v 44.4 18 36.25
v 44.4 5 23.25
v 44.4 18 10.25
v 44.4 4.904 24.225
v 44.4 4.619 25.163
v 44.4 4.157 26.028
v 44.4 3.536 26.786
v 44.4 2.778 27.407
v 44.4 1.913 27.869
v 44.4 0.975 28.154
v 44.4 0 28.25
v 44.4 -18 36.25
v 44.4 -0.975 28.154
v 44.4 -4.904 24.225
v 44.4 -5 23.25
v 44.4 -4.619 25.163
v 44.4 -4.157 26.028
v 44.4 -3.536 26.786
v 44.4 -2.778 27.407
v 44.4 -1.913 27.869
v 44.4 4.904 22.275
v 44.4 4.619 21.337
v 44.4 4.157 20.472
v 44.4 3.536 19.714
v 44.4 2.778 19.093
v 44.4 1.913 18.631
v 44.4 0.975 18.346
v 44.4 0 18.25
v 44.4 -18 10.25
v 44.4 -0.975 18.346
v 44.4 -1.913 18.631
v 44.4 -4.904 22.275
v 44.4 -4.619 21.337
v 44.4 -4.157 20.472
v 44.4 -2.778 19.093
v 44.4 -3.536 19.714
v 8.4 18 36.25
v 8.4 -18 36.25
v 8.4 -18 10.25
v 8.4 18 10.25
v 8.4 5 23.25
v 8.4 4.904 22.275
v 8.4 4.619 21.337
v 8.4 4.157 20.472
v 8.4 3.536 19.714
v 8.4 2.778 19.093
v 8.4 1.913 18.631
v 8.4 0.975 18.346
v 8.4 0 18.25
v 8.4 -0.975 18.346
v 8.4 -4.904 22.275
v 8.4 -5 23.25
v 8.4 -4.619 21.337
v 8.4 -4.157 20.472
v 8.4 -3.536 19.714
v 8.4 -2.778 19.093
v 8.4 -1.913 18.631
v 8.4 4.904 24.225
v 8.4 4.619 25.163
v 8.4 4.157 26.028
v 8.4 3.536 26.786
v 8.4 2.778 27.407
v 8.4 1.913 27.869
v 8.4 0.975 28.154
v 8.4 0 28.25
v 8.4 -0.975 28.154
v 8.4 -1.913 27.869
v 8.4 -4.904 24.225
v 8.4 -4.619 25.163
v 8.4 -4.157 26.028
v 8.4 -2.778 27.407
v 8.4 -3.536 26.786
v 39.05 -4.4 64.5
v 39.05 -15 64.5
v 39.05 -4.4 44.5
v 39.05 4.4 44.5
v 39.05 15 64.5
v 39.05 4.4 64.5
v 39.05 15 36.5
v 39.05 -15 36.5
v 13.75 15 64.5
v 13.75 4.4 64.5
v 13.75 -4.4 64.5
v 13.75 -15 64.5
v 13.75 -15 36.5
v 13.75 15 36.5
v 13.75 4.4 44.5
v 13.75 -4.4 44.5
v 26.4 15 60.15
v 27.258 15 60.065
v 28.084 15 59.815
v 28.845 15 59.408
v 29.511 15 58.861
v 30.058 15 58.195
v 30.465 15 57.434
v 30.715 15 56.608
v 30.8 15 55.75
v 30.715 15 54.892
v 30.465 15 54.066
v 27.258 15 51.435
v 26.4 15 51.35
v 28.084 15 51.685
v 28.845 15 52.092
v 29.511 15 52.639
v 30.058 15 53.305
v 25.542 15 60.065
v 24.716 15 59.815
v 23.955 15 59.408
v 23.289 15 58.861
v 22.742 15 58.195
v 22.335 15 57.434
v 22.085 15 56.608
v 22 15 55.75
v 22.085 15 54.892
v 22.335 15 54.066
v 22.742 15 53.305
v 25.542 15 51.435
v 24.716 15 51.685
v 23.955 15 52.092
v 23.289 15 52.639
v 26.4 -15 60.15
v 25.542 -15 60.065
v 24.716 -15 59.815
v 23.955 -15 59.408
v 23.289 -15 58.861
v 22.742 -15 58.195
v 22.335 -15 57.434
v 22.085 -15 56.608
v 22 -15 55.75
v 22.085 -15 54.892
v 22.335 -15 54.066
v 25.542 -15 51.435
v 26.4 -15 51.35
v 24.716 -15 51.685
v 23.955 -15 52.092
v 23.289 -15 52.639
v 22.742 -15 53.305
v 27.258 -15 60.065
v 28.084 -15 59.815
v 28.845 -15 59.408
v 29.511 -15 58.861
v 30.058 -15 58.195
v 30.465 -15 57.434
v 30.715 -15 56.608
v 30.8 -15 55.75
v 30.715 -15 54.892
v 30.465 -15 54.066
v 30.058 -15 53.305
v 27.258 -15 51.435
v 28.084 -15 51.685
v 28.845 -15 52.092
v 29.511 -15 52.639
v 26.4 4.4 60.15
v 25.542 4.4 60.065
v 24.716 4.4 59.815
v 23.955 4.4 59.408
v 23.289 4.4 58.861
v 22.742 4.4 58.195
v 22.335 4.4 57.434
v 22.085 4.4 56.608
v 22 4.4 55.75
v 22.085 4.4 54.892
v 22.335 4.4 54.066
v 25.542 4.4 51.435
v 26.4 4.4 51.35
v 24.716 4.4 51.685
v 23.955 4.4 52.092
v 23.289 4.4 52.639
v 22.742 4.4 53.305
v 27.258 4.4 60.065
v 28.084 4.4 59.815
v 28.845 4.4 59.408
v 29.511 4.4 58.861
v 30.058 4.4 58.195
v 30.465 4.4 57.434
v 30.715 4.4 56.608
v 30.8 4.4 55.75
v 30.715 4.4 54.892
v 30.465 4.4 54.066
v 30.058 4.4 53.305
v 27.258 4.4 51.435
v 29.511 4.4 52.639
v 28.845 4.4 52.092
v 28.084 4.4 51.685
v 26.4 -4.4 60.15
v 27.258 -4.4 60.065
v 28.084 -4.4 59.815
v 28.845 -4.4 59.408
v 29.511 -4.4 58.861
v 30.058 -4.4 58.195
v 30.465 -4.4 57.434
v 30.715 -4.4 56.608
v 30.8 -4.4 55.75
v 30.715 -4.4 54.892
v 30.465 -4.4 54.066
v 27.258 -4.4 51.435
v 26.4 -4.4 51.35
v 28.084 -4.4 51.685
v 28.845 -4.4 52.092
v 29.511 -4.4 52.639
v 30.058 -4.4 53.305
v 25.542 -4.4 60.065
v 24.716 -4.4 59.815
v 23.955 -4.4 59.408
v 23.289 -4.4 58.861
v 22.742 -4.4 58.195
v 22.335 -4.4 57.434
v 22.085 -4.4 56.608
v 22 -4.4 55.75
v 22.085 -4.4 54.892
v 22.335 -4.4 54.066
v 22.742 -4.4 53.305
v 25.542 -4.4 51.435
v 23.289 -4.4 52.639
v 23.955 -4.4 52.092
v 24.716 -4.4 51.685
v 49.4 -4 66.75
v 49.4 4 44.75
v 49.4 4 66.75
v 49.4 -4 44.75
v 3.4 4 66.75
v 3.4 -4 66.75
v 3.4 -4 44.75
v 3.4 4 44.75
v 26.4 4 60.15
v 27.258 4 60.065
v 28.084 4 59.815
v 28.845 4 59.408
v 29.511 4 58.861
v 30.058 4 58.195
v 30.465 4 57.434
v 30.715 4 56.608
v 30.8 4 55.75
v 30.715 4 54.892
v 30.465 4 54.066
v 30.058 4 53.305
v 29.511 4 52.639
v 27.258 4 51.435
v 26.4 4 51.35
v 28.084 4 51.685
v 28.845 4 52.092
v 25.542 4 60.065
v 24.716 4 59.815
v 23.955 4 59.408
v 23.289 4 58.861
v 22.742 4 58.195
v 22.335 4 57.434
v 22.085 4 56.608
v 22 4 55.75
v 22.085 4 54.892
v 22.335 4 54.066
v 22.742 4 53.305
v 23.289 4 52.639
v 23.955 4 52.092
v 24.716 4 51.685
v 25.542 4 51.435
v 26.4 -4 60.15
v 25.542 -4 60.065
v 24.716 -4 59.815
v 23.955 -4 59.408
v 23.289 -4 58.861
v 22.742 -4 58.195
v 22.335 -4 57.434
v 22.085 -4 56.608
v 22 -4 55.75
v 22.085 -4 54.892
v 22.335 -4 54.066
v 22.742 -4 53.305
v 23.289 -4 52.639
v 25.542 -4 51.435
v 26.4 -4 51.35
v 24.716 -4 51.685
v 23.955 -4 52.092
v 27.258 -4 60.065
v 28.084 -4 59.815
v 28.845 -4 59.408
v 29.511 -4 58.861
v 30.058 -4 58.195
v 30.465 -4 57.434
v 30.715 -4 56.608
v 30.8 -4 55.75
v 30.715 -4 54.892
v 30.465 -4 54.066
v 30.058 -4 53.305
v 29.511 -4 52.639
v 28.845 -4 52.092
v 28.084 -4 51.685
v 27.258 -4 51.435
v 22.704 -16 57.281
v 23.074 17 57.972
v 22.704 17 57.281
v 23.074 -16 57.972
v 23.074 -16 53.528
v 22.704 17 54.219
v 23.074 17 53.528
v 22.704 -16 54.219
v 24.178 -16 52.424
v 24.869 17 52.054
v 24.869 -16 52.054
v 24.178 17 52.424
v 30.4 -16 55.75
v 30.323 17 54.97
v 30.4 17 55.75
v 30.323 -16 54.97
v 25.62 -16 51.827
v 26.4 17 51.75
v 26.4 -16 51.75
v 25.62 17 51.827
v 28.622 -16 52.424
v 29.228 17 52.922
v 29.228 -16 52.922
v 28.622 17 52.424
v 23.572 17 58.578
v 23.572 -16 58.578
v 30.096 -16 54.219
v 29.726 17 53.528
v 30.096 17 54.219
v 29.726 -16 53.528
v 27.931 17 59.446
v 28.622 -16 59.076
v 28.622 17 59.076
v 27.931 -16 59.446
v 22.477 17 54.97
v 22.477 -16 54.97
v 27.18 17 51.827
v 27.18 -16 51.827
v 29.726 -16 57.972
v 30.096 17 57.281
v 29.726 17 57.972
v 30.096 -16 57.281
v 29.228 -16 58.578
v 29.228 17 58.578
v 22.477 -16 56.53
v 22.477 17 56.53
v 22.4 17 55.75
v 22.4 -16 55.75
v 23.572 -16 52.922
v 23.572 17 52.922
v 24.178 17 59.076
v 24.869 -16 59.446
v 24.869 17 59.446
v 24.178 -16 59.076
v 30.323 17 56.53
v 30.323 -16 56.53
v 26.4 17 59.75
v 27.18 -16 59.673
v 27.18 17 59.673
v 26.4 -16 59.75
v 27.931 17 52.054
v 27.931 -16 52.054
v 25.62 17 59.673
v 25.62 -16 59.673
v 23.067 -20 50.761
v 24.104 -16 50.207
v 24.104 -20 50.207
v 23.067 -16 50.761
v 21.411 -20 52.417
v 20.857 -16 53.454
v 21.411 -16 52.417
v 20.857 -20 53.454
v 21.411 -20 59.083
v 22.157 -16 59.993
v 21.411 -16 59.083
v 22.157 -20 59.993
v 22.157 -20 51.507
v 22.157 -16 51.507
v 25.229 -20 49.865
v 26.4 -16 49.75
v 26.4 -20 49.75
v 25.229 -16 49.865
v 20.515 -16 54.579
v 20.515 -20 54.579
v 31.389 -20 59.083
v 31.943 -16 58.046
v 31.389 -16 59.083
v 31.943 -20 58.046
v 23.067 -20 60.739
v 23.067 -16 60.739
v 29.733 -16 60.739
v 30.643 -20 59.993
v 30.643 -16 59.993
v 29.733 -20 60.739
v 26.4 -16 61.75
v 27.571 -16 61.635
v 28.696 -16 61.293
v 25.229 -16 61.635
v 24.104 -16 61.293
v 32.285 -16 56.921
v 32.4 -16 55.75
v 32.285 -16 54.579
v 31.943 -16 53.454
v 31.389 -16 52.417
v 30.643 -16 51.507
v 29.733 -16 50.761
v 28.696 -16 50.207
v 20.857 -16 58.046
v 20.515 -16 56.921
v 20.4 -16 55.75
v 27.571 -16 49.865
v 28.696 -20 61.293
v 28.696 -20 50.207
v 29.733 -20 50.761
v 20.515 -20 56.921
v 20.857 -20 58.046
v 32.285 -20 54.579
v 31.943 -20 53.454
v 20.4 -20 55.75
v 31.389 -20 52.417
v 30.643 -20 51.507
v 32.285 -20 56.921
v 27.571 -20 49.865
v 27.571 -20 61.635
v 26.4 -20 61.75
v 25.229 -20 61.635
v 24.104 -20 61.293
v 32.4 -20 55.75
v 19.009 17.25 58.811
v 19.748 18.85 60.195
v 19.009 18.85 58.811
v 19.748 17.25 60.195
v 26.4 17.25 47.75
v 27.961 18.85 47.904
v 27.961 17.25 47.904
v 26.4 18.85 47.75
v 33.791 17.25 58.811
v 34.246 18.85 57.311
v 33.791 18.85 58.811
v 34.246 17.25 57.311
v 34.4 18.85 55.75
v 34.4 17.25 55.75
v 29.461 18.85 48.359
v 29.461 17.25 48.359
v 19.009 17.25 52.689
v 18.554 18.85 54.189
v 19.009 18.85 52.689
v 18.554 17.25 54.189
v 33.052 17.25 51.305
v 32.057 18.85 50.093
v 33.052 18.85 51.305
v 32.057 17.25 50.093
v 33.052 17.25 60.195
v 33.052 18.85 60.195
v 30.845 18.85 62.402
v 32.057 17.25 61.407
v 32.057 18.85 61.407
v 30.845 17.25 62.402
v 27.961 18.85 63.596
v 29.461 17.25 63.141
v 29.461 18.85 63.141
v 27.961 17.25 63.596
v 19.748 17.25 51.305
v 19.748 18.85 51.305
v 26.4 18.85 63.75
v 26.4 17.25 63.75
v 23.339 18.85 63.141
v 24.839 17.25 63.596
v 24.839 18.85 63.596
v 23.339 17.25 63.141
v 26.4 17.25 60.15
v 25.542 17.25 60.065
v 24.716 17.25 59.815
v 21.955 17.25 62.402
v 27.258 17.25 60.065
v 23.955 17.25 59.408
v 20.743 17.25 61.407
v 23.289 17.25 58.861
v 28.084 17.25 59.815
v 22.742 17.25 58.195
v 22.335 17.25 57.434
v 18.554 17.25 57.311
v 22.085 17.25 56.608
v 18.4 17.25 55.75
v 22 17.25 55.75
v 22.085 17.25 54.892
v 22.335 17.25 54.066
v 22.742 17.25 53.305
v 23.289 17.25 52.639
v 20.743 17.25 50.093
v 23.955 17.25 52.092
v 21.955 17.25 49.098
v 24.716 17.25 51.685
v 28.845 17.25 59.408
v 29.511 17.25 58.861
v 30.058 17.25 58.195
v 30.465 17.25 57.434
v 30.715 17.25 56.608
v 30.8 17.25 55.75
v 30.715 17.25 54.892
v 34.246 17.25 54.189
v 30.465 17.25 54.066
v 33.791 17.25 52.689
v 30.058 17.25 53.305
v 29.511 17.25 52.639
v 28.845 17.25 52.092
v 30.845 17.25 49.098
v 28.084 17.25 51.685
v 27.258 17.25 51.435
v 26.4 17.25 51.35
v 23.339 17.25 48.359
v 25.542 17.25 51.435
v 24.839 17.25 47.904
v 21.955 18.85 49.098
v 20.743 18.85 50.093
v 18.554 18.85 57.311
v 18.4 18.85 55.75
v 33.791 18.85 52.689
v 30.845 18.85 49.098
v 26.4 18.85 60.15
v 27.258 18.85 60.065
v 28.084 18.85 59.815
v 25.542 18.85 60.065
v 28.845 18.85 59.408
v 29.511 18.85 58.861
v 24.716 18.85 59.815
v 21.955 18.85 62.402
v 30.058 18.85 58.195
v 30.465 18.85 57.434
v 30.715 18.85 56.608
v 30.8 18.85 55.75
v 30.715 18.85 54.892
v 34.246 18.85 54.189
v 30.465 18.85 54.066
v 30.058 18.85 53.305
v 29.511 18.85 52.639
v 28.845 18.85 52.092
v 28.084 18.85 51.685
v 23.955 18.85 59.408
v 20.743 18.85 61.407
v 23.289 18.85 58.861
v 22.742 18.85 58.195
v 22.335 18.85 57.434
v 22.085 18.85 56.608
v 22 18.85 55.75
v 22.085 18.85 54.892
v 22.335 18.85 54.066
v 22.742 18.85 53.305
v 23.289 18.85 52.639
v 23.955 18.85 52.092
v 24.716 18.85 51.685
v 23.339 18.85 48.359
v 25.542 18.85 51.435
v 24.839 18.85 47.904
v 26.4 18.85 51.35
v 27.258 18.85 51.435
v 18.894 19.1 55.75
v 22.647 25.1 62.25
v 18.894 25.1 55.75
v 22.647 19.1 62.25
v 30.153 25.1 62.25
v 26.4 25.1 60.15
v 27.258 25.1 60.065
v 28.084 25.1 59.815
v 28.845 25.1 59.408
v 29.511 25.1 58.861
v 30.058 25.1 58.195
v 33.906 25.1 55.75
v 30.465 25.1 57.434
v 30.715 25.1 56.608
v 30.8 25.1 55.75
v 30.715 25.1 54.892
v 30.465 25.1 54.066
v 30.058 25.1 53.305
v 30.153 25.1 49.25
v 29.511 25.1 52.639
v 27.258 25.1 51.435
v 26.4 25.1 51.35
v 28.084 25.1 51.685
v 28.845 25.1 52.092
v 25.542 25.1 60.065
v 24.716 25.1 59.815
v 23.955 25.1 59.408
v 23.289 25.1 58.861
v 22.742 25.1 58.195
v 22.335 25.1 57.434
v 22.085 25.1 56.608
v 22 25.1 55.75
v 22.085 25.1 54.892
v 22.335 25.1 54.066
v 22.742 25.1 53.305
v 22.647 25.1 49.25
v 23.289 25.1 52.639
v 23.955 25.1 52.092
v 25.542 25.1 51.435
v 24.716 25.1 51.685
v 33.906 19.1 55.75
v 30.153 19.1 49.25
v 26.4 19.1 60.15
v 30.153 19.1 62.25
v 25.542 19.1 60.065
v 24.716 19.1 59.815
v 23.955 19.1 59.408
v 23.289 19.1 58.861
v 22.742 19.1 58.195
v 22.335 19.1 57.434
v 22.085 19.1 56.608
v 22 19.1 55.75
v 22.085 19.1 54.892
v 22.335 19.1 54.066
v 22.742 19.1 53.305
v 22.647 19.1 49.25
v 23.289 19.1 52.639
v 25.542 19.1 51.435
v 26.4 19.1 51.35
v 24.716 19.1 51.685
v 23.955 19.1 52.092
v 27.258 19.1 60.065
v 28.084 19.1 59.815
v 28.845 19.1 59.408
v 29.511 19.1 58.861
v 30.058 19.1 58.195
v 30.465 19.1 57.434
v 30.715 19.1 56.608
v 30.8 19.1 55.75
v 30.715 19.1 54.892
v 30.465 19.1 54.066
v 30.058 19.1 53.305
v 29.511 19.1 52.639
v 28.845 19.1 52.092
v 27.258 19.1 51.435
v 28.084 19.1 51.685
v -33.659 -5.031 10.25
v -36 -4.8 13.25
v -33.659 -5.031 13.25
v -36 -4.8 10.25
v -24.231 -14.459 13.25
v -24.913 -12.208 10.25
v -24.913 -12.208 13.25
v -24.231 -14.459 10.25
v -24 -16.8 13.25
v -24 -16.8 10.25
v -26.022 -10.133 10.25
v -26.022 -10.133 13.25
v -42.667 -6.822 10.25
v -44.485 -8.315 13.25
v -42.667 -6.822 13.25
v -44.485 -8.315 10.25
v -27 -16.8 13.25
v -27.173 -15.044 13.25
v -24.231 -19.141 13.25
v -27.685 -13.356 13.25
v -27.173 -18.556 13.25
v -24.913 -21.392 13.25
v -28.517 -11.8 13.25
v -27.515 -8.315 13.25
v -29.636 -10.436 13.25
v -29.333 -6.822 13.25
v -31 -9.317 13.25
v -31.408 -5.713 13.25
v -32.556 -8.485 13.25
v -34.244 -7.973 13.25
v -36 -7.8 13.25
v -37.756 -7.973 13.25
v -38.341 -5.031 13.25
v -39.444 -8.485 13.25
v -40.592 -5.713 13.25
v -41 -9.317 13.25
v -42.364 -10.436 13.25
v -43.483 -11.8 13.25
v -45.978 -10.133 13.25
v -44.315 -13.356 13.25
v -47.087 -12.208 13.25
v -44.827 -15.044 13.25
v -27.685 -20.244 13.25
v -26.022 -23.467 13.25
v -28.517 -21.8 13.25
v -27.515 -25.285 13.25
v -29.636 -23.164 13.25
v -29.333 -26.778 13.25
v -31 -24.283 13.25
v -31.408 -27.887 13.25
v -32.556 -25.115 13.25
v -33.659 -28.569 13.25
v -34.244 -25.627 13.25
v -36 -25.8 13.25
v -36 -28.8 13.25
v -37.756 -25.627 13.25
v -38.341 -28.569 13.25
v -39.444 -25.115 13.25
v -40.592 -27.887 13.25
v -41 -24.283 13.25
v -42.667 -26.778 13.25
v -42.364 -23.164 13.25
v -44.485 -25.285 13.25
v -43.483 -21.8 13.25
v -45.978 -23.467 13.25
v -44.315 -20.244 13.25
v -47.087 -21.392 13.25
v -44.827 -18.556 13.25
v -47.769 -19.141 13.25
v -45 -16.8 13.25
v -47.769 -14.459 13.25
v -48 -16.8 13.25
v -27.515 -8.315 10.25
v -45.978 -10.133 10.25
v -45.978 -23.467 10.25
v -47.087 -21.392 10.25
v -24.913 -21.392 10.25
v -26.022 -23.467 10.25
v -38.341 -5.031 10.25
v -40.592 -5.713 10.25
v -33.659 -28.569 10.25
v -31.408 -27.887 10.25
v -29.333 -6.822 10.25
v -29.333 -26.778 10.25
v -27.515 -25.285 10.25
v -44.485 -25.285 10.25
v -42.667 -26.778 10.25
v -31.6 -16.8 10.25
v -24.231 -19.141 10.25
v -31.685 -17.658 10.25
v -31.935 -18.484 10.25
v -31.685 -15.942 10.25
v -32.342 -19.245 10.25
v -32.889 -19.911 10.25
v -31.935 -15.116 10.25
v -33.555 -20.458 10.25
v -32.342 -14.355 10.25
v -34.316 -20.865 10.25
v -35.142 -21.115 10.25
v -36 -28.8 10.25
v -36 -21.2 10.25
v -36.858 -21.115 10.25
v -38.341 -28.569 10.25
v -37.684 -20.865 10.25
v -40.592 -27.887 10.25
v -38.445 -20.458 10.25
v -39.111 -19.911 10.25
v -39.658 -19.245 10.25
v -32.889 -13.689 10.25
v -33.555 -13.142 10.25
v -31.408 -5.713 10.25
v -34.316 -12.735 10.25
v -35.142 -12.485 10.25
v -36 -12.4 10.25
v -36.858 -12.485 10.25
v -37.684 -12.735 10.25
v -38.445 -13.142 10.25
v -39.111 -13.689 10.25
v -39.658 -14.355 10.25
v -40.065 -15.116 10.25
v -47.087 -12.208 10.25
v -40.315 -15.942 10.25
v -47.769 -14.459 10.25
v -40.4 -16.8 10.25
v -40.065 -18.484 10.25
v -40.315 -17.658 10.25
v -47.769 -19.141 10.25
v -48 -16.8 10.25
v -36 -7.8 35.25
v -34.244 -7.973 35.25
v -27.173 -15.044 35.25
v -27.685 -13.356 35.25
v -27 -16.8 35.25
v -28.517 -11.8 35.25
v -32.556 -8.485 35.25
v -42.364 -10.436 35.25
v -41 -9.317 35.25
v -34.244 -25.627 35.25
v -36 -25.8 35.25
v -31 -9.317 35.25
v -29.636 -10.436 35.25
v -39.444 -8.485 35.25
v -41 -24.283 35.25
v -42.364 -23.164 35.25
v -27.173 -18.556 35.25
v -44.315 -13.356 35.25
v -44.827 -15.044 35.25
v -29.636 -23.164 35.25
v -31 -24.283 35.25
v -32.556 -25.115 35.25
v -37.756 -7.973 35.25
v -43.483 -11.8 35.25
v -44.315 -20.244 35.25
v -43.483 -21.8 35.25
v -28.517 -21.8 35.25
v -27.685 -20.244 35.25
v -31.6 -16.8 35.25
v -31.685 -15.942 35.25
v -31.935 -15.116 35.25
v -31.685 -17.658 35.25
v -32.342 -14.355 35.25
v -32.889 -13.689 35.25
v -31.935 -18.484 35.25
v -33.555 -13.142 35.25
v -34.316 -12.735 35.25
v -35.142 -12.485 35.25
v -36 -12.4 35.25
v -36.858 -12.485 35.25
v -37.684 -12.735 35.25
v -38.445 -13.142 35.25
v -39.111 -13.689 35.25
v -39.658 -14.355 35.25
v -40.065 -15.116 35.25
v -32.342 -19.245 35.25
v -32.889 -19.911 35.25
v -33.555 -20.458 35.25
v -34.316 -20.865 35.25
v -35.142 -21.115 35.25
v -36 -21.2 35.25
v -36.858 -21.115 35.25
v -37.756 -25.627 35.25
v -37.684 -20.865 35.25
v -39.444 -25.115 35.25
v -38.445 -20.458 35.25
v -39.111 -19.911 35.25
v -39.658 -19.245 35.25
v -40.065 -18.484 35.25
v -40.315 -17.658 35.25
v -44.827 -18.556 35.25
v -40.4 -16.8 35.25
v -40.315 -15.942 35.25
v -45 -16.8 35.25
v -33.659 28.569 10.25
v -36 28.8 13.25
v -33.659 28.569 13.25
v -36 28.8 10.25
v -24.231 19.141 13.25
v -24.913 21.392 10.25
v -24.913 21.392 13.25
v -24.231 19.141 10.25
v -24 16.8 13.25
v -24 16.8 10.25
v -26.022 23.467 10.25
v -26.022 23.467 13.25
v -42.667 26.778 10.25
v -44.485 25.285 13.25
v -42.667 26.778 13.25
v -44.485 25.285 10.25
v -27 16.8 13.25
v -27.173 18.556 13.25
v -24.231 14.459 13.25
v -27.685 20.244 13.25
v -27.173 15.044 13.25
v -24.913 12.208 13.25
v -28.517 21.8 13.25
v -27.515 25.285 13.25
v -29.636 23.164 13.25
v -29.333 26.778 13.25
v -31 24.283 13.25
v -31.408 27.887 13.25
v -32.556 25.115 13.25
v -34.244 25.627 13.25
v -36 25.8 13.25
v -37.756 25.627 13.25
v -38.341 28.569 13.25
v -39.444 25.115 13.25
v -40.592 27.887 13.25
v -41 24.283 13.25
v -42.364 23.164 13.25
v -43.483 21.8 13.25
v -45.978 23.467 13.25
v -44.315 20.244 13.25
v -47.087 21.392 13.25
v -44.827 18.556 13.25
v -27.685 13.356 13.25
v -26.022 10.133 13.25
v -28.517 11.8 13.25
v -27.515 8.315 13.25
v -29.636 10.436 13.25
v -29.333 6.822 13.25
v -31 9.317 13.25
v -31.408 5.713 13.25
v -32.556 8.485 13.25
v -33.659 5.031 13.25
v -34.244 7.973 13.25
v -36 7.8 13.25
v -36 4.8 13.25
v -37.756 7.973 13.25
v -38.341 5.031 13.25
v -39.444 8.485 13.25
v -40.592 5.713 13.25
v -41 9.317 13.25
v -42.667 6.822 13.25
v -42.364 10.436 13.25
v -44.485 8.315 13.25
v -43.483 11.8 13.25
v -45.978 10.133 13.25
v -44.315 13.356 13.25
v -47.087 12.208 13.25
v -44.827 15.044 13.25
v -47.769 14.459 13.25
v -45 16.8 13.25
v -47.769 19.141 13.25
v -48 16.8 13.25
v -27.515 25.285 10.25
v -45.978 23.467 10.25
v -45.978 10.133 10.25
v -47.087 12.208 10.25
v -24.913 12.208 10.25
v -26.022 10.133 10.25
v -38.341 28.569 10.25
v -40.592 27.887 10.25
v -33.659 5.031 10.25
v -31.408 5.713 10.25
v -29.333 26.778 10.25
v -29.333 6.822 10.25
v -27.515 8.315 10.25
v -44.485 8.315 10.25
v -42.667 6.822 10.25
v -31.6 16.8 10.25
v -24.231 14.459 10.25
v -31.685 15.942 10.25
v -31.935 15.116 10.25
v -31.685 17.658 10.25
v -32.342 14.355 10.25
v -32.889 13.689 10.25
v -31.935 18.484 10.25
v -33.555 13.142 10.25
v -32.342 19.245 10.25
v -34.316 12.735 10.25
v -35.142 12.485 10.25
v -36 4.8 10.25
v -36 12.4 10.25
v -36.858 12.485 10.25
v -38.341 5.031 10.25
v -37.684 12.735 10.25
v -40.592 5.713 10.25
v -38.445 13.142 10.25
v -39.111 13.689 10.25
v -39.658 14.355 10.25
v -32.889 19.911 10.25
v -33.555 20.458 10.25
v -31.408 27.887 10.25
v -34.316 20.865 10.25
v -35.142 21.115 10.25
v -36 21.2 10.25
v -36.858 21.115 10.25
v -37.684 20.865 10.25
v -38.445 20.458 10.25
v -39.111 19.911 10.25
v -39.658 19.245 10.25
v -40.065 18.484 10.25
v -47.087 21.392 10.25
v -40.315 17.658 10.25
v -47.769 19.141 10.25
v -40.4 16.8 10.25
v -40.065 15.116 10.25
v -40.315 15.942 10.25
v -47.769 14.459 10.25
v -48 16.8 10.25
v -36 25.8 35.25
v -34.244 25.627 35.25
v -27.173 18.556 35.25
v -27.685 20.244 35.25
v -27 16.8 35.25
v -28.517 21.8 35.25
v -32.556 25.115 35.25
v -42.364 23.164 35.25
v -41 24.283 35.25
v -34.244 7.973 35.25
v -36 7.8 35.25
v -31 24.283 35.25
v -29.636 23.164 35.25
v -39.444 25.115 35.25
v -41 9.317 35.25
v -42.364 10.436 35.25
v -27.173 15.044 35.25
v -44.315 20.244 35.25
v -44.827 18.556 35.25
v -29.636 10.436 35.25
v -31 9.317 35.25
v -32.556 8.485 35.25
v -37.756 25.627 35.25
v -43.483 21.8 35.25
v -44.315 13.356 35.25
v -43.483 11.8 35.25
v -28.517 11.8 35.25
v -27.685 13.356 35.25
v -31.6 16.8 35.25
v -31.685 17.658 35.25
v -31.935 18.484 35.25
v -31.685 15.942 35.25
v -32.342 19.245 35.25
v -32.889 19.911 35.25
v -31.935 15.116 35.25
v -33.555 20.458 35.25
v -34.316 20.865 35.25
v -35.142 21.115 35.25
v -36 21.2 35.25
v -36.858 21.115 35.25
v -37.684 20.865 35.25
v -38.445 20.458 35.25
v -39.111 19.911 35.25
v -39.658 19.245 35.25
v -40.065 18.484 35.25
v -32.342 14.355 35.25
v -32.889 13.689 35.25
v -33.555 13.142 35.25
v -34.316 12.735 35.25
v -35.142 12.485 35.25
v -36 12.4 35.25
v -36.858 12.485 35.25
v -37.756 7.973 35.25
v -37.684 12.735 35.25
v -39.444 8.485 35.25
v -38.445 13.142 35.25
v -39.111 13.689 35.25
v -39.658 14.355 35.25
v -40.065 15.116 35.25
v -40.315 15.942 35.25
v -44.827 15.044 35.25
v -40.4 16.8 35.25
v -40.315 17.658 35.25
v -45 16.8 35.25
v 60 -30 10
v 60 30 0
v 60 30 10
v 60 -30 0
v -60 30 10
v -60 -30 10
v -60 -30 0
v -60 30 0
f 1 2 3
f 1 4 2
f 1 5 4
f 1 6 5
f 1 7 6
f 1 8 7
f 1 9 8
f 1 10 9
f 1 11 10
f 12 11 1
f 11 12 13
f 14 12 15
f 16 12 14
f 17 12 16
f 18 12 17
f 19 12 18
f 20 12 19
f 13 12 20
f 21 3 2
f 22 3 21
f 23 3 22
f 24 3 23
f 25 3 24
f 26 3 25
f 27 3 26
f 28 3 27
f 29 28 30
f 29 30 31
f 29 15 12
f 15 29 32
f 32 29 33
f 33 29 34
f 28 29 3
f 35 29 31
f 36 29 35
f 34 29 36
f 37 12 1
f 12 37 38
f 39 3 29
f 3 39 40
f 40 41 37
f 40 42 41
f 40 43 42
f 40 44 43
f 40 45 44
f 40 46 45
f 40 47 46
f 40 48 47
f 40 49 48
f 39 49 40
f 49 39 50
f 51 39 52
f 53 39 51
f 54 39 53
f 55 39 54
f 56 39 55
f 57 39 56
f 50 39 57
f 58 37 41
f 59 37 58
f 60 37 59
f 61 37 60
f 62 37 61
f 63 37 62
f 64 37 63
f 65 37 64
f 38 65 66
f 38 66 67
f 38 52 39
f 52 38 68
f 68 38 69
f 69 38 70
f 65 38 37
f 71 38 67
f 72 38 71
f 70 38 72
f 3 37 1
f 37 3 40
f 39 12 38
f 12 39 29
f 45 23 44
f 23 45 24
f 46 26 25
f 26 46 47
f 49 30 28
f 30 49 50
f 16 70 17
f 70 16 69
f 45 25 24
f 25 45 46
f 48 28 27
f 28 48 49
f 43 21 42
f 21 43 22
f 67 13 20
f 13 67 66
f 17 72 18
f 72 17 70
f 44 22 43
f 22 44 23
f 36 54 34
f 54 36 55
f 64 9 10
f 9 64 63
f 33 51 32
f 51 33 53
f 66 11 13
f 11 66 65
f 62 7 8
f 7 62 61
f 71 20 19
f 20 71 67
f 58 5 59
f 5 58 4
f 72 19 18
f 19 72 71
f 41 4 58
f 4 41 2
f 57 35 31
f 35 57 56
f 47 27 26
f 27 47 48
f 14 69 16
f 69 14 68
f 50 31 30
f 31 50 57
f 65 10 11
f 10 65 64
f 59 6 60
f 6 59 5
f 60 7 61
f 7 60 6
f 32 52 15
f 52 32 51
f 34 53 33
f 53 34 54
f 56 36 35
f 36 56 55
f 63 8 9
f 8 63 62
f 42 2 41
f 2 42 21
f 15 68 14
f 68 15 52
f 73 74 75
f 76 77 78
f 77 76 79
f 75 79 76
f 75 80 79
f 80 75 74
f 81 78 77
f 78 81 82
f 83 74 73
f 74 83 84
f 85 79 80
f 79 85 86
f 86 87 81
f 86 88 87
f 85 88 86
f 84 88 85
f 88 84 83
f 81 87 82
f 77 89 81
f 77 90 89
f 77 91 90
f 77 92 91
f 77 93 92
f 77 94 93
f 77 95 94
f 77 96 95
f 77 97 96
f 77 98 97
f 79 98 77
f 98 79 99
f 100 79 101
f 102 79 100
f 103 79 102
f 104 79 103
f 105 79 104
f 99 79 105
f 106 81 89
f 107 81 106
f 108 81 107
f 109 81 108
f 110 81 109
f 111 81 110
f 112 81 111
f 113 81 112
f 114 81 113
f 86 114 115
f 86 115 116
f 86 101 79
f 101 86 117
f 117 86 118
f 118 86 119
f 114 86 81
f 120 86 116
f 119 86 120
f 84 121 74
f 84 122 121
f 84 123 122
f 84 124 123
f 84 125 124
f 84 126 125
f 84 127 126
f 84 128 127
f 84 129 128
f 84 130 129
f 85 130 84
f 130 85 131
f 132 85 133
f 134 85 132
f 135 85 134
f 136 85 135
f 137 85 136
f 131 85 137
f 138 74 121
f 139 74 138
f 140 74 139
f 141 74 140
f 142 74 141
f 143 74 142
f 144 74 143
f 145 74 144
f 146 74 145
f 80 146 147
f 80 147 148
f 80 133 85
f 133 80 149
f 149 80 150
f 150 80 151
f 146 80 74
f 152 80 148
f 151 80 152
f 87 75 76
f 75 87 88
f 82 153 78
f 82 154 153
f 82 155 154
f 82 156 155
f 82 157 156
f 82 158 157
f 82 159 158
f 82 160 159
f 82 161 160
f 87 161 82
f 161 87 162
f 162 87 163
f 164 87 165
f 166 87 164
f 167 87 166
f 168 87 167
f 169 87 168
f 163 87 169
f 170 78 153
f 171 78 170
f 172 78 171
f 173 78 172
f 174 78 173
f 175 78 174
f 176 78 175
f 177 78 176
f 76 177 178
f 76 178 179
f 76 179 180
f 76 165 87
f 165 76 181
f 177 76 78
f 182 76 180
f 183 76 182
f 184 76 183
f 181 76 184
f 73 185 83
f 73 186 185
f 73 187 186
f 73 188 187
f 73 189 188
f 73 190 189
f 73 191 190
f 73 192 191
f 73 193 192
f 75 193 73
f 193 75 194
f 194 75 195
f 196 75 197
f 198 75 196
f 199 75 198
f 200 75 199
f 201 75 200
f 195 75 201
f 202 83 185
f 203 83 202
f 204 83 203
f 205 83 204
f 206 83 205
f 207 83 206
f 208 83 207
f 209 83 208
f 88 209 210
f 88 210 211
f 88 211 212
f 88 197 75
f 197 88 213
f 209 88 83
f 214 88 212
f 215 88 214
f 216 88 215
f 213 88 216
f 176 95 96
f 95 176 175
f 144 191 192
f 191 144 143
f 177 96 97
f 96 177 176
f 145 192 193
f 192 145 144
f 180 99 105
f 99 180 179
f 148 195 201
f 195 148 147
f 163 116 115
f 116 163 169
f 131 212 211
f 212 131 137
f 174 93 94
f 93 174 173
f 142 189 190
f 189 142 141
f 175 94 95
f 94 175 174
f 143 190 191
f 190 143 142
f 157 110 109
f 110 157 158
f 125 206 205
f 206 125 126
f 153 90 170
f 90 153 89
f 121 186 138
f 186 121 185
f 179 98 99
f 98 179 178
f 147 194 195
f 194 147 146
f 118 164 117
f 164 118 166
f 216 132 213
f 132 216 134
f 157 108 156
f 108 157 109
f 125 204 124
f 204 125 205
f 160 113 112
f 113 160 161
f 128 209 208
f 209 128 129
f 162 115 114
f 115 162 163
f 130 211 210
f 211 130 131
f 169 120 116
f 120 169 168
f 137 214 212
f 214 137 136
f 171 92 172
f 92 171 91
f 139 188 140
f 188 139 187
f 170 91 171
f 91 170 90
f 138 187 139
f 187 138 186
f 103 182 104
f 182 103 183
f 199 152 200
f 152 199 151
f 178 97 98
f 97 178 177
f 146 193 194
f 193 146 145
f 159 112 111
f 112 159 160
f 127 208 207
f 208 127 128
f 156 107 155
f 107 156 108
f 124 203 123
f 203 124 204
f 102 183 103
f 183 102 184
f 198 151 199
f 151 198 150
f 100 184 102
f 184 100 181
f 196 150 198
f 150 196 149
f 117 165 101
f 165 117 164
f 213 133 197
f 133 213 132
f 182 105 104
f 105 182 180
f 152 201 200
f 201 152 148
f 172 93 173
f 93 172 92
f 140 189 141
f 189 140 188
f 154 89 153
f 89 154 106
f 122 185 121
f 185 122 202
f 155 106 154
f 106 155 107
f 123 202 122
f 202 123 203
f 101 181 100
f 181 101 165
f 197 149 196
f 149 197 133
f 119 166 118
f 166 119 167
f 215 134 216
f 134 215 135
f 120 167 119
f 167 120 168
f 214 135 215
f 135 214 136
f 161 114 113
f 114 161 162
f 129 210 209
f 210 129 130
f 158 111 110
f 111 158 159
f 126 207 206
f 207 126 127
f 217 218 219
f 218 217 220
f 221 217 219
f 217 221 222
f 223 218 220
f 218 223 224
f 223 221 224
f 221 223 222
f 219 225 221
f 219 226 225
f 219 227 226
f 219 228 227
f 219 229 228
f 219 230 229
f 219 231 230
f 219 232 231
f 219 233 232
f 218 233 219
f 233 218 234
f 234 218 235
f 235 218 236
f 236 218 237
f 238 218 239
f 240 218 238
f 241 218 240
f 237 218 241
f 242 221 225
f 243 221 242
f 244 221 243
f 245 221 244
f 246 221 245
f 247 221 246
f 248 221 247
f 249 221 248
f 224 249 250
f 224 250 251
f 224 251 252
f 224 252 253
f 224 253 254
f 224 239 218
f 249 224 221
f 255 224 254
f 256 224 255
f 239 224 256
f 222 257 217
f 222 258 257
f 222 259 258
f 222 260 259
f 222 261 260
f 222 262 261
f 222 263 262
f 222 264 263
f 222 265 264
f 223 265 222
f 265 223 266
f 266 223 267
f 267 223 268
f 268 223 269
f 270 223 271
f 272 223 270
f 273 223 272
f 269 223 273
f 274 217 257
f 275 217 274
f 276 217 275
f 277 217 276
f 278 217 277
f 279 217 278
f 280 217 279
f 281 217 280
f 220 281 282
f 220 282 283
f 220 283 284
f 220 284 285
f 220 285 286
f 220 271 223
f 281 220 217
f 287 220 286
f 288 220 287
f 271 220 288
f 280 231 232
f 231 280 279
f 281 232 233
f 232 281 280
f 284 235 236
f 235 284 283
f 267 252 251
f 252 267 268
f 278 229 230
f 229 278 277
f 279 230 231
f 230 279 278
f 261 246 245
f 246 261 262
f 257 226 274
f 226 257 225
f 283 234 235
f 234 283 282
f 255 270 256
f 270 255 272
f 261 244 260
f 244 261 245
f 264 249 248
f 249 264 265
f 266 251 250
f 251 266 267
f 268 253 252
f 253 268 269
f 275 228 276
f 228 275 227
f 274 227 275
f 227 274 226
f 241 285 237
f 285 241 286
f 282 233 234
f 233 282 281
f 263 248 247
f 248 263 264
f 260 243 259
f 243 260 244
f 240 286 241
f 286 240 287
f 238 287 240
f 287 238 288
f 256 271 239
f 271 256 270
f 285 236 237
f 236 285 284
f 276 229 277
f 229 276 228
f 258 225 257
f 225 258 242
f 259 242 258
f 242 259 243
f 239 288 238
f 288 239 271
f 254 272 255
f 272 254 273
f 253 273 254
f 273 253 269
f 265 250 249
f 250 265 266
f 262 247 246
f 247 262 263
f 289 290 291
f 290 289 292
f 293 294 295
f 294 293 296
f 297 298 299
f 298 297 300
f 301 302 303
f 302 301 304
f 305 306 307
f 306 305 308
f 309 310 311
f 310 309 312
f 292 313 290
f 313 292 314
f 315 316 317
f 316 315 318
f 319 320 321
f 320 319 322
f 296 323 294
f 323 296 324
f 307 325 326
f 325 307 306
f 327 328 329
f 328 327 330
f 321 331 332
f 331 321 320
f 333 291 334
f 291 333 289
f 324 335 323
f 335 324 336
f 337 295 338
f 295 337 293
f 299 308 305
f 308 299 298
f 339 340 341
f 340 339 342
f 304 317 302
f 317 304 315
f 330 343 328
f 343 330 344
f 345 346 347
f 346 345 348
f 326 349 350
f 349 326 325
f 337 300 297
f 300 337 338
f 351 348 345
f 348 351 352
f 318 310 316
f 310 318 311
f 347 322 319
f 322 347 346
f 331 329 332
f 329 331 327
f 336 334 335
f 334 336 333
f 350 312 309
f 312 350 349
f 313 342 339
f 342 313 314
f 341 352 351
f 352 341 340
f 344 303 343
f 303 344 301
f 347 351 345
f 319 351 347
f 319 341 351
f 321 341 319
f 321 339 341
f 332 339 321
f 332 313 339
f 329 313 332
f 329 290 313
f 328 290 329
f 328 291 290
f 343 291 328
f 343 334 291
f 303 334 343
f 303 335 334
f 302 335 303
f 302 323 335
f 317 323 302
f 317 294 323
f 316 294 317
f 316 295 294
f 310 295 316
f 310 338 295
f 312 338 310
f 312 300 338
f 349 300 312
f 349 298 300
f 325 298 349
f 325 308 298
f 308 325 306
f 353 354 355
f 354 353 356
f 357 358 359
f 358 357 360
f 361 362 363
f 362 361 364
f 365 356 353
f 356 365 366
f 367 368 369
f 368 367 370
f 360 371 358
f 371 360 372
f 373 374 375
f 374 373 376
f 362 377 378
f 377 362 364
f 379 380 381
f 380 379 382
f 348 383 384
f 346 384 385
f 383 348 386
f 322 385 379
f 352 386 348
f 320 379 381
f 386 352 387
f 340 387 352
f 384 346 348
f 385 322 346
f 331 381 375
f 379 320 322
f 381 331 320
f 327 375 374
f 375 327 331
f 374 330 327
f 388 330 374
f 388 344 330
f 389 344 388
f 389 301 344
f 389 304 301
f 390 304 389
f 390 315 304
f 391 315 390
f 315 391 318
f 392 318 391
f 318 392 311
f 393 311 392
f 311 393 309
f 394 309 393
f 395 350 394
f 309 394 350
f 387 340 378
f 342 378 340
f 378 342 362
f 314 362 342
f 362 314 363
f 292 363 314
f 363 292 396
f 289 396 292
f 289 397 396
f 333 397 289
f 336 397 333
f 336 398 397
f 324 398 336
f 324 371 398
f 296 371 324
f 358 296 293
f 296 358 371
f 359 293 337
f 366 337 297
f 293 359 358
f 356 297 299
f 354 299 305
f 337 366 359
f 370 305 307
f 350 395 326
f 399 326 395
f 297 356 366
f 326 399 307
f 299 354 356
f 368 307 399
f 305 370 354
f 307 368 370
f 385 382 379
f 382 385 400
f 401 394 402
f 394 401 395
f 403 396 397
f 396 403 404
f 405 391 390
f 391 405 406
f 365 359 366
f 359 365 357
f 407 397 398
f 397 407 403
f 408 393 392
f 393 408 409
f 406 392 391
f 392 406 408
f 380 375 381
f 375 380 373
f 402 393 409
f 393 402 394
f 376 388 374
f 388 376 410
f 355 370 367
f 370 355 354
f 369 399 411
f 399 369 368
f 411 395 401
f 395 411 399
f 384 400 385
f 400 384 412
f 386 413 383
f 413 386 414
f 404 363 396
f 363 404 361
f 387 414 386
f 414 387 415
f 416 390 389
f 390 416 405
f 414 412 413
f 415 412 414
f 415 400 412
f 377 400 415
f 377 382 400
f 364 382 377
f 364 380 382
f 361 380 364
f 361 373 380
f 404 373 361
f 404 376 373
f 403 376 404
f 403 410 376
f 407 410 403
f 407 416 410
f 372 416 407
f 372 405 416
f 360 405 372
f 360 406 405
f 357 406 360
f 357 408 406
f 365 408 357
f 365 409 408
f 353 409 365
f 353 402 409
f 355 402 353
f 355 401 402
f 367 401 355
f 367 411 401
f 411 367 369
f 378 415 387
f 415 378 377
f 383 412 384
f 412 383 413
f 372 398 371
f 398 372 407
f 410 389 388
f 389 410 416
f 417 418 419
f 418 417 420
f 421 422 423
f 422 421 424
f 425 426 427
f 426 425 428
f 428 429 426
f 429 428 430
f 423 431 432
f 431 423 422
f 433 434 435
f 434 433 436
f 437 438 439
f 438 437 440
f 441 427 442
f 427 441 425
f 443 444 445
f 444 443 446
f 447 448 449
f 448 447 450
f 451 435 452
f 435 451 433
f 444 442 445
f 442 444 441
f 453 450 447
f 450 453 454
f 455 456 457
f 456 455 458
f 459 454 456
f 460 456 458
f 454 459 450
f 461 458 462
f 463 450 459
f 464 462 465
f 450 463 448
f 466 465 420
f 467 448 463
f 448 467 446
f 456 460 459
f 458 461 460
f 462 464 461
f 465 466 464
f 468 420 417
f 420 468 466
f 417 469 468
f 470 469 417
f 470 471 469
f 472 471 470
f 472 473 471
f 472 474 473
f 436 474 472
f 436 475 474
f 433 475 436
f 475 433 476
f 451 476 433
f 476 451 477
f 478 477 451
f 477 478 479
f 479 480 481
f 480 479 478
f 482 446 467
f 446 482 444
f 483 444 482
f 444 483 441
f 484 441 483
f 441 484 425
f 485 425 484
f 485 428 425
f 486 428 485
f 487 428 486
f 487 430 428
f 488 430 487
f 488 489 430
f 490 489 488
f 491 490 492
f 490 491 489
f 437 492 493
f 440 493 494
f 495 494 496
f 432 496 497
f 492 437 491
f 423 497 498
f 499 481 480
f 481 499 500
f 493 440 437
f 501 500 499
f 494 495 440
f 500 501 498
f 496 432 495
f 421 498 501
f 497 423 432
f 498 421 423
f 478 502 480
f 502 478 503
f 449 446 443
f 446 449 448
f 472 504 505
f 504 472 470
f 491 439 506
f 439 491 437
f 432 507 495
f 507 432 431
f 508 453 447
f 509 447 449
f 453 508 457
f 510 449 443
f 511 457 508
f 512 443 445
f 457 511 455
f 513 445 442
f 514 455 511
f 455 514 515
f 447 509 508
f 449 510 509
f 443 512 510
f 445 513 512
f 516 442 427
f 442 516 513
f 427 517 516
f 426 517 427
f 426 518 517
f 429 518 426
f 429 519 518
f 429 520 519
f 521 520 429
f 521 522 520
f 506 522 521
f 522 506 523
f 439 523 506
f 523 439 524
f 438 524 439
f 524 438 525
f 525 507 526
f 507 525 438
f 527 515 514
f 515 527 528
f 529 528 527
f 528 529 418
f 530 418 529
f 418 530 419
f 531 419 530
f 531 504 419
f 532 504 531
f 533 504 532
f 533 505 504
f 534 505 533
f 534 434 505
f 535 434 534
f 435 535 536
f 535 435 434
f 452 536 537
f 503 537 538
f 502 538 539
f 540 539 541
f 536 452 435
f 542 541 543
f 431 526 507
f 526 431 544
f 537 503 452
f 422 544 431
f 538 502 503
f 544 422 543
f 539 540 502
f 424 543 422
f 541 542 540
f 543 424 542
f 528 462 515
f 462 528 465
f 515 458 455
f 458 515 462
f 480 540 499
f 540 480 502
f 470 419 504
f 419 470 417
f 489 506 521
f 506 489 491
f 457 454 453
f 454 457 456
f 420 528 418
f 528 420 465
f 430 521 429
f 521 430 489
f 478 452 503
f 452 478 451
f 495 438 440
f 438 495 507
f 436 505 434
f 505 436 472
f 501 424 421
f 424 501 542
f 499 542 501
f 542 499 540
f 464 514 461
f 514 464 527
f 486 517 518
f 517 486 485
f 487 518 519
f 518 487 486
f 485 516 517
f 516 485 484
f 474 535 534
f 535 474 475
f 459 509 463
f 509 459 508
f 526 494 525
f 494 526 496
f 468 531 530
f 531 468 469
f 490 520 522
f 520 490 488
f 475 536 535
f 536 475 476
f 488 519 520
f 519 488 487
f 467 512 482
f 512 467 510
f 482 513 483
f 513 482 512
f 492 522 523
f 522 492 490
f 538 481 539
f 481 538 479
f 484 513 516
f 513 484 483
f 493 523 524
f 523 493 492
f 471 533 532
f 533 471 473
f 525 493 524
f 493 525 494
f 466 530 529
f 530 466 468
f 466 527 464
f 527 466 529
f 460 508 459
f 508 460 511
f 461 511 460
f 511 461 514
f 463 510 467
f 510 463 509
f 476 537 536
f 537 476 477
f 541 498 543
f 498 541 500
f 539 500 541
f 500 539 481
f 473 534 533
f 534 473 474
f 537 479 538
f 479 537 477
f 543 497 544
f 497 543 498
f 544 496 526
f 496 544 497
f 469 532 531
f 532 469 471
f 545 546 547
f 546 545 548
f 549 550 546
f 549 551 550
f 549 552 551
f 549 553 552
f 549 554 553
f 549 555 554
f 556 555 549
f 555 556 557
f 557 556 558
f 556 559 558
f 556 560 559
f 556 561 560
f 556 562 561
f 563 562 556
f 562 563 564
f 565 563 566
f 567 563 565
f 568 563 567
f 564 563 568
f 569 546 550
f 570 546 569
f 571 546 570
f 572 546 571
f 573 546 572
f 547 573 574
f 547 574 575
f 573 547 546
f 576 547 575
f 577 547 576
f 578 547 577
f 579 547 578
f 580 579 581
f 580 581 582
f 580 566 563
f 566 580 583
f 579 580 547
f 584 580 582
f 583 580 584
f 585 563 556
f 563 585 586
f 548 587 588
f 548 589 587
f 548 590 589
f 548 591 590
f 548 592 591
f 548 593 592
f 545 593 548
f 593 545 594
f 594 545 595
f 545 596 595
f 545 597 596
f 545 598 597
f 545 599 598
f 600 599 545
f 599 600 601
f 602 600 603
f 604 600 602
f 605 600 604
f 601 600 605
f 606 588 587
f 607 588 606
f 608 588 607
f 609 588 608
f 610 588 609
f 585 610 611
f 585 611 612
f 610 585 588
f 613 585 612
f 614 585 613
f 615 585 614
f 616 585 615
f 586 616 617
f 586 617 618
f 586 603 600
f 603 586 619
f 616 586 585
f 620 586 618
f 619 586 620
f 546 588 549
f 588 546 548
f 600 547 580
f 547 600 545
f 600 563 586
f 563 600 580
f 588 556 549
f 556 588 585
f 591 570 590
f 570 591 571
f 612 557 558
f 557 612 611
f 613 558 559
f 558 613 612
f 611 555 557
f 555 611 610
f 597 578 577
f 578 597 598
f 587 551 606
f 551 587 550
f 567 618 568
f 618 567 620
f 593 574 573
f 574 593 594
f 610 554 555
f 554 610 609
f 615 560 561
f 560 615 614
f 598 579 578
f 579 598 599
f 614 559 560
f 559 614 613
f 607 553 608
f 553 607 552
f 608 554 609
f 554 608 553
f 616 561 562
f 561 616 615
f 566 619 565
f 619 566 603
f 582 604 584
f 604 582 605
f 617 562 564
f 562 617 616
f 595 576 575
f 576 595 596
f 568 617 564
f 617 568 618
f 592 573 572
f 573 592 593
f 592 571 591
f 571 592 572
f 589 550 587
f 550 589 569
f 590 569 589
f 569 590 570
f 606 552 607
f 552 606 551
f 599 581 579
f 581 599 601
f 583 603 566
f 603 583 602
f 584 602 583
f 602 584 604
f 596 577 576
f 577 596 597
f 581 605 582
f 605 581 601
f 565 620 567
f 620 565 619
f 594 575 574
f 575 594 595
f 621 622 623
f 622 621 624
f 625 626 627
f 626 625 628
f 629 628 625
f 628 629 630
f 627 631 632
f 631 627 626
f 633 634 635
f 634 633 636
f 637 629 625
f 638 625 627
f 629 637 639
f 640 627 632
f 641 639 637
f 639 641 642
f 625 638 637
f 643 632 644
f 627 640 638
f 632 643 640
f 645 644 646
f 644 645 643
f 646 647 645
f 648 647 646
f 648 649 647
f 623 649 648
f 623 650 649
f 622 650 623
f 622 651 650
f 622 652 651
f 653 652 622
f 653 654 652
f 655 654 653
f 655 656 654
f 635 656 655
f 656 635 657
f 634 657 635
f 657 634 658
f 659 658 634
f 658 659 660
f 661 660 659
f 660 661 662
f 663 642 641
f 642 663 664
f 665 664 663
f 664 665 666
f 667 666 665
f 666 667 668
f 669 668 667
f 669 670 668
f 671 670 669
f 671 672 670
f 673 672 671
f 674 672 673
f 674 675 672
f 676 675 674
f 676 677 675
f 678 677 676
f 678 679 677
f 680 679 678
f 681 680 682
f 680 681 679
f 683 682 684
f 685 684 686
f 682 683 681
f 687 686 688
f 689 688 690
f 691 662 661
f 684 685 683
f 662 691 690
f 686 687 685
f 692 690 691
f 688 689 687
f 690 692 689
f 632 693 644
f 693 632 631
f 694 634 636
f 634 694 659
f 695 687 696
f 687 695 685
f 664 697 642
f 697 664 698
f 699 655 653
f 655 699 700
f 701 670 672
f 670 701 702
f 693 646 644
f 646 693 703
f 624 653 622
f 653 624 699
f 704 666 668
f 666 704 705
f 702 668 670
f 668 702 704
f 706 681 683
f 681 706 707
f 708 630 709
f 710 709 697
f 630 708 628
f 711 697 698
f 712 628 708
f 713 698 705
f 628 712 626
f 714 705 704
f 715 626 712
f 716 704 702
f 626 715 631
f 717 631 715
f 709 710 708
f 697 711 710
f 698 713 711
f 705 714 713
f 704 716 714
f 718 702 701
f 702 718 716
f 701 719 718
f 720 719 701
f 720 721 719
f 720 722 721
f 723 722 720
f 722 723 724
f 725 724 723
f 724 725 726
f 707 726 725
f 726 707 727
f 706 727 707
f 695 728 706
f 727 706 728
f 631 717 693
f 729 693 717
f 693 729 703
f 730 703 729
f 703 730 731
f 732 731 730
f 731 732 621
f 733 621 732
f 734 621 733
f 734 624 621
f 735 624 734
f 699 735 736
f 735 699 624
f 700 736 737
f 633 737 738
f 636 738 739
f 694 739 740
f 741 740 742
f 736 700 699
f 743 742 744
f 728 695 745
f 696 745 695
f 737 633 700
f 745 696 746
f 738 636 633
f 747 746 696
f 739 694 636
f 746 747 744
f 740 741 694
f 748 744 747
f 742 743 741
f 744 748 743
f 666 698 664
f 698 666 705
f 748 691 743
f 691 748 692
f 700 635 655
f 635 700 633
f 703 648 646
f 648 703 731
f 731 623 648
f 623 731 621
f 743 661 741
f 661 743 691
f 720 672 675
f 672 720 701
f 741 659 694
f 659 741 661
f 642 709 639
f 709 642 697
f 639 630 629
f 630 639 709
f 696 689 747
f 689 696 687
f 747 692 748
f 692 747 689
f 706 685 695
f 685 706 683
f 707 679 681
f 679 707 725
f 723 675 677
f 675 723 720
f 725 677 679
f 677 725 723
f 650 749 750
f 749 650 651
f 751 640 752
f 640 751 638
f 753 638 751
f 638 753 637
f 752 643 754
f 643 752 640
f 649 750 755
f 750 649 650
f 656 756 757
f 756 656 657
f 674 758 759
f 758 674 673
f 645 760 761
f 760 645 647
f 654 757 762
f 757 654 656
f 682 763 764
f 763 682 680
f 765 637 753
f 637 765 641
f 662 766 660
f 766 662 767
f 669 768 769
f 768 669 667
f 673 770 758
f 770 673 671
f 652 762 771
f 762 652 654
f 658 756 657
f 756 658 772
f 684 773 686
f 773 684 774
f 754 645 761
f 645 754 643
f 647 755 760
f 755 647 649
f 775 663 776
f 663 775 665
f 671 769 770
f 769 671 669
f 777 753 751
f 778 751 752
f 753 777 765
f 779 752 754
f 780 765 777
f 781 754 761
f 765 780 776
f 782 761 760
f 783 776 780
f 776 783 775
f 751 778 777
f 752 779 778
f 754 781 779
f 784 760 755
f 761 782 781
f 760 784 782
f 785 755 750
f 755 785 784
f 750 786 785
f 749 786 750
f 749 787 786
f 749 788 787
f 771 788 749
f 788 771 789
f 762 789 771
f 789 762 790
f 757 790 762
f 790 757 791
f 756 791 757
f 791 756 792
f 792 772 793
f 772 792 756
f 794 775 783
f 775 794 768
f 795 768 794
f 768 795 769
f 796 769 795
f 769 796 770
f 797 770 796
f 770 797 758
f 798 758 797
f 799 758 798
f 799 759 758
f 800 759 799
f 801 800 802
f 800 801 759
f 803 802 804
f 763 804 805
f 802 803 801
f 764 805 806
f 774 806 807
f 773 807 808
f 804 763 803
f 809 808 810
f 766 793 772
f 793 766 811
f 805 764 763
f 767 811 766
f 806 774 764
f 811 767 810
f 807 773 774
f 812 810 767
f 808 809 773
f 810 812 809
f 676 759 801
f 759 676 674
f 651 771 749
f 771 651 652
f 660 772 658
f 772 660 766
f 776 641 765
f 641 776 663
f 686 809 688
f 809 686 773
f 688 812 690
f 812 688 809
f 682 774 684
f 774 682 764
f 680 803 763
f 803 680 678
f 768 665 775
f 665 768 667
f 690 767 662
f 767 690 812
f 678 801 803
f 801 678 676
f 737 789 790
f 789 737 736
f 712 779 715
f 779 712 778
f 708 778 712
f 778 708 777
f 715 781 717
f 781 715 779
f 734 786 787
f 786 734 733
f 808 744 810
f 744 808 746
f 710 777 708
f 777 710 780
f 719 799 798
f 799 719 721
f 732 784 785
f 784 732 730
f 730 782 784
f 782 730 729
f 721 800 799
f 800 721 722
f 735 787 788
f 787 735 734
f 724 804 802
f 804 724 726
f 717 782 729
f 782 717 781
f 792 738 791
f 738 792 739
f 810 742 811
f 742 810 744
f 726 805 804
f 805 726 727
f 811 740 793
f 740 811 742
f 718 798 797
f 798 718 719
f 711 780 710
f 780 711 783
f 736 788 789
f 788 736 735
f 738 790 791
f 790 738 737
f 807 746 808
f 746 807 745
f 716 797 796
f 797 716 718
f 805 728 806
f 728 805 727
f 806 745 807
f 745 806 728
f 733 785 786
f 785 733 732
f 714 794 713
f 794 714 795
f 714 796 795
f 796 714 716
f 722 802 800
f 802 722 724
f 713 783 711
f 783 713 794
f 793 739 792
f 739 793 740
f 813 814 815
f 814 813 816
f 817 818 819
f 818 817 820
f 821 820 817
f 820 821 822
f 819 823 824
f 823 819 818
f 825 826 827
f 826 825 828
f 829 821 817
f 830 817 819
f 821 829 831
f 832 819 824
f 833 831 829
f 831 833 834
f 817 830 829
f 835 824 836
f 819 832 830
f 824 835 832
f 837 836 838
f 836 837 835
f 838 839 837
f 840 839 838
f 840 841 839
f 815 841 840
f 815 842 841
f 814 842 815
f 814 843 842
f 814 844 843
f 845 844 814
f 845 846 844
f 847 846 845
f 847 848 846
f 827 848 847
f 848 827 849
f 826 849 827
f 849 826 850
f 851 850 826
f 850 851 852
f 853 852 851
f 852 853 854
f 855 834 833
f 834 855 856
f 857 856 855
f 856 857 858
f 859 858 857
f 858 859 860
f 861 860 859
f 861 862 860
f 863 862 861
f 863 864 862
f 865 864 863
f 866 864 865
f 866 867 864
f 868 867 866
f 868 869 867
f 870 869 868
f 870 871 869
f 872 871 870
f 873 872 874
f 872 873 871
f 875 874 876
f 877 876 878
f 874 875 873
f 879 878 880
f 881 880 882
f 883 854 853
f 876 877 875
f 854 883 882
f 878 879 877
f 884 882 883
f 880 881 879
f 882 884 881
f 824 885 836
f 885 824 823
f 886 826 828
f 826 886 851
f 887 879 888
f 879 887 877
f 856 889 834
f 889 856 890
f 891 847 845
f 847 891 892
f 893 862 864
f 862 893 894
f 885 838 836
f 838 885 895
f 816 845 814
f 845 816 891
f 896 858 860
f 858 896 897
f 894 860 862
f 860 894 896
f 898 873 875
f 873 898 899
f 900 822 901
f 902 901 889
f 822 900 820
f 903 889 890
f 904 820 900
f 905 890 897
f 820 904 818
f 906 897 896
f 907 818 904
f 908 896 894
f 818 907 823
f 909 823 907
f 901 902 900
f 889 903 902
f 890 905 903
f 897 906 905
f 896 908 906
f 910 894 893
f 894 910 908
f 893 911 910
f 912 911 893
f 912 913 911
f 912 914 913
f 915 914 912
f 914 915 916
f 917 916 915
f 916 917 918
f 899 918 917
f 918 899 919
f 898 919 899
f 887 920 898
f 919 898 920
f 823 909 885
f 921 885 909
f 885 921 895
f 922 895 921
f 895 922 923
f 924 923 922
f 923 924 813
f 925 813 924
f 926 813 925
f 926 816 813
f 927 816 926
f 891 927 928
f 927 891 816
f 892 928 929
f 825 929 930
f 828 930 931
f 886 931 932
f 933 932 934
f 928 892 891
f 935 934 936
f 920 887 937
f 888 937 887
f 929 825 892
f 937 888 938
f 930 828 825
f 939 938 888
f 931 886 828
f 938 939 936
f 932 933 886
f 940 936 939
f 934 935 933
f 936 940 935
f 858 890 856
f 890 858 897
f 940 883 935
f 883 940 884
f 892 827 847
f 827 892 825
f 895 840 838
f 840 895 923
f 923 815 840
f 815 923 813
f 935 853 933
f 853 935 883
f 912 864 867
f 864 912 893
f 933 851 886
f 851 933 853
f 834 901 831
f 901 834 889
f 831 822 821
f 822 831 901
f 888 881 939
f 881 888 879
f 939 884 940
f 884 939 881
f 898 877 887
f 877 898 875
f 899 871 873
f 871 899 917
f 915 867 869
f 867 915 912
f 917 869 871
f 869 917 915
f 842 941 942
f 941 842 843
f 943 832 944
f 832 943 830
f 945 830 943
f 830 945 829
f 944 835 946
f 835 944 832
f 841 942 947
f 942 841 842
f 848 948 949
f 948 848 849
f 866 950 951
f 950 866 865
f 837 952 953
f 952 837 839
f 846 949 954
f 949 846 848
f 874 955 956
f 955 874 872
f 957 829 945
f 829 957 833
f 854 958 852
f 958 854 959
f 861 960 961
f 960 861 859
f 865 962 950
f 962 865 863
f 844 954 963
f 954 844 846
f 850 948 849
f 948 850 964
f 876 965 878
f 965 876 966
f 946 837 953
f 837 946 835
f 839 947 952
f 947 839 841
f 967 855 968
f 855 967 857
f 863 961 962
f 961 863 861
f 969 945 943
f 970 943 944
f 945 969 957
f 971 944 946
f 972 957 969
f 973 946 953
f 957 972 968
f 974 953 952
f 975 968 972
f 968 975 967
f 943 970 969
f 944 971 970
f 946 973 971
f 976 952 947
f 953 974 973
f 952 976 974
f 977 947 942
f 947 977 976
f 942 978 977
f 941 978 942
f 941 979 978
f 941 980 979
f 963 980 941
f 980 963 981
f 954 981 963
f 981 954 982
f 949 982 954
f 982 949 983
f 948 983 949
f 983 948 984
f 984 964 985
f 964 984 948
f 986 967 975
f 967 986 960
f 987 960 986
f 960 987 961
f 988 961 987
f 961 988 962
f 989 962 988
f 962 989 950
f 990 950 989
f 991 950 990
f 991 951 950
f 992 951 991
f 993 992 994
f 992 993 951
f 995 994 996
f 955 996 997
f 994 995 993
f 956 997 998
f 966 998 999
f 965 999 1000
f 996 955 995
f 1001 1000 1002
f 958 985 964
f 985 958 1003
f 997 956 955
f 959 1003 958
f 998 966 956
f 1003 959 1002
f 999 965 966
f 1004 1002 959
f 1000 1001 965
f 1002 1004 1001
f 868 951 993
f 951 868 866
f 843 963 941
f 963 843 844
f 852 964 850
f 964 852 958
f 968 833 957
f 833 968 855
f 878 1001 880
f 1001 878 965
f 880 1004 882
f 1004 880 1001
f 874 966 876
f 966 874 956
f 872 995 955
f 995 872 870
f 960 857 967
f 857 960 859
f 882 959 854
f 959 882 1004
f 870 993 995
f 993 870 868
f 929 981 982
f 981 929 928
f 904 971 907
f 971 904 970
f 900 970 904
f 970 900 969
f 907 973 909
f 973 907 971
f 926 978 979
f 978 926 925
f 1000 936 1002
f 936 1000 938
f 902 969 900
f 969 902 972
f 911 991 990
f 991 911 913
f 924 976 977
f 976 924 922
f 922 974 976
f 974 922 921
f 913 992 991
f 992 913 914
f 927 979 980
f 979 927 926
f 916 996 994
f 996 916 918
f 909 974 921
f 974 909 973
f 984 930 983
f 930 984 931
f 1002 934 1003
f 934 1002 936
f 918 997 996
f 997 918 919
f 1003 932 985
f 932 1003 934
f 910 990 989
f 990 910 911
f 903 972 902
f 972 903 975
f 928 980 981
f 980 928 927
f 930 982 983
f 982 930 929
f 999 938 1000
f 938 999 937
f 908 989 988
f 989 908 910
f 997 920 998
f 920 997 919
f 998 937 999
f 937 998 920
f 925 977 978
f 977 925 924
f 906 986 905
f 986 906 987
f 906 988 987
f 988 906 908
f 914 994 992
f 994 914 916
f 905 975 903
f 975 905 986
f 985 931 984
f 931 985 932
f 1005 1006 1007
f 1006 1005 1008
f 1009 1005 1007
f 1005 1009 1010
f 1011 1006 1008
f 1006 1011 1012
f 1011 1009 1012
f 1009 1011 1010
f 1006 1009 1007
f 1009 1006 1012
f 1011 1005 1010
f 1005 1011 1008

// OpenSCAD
$fn = 32;

// ------------------------------------------------------------------------
// Indexing jig: plate 120 x 60 mm, pin d8
// Every part is its own module, assembly() places every instance.
// ------------------------------------------------------------------------

// --- part 1 ---
module jig_plate() {
  difference() {
    translate([-60, -30, 0]) cube([120, 60, 10]);
  }
}

// --- part 2 ---
module locator_block() {
  difference() {
    translate([-18, -18, 0]) cube([36, 36, 26]);
    translate([0, 0, 13]) rotate([0, 90, 0]) cylinder(h = 38, d = 10, center = true);
  }
}

// --- part 3 ---
module index_fork() {
  difference() {
    translate([-12.65, -15, 0]) cube([25.3, 30, 28]);
    translate([-13.65, -4.4, 8]) cube([27.3, 8.8, 21]);
    translate([0, 0, 19.25]) rotate([90, 0, 0]) cylinder(h = 32, d = 8.8, center = true);
  }
}

// --- part 4 ---
module index_arm() {
  difference() {
    translate([-23, -4, 0]) cube([46, 8, 22]);
    translate([0, 0, 11]) rotate([90, 0, 0]) cylinder(h = 10, d = 8.8, center = true);
  }
}

// --- part 5 ---
module index_pin() {
  rotate([0, 90, 0]) cylinder(h = 34, d = 8, center = true);
  translate([-20, 0, 0]) rotate([0, 90, 0]) cylinder(h = 4, d = 12);
}

// --- part 6 ---
module pin_washer() {
  difference() {
      translate([0, 0, 0]) cylinder(h = 1.6, d = 16);
      translate([0, 0, -1]) cylinder(h = 3.6, d = 8.8);
    }
}

// --- part 7 ---
module lock_nut() {
  difference() {
    linear_extrude(height = 6) polygon(points = [[7.506, 0], [3.753, 6.5], [-3.753, 6.5], [-7.506, 0], [-3.753, -6.5], [3.753, -6.5]]);
    translate([0, 0, -1]) cylinder(h = 8, d = 8.8);
  }
}

// --- part 8 ---
module guide_bush_a() {
  difference() {
    union() {
      cylinder(h = 3, d = 24);
      translate([0, 0, 3]) cylinder(h = 22, d = 18);
    }
    translate([0, 0, -1]) cylinder(h = 27, d = 8.8);
  }
}

// --- part 9 ---
module guide_bush_b() {
  difference() {
    union() {
      cylinder(h = 3, d = 24);
      translate([0, 0, 3]) cylinder(h = 22, d = 18);
    }
    translate([0, 0, -1]) cylinder(h = 27, d = 8.8);
  }
}

// --- assembly ---
module assembly() {
  color([0.80, 0.24, 0.20]) translate([0, 0, 0]) rotate([0, 0, 0]) jig_plate();
  color([0.20, 0.45, 0.75]) translate([26.4, 0, 10.25]) rotate([0, 0, 0]) locator_block();
  color([0.25, 0.62, 0.32]) translate([26.4, 0, 36.5]) rotate([0, 0, 0]) index_fork();
  color([0.92, 0.70, 0.18]) translate([26.4, 0, 44.75]) rotate([0, 0, 0]) index_arm();
  color([0.58, 0.35, 0.70]) translate([26.4, 0, 55.75]) rotate([0, 0, 90]) index_pin();
  color([0.16, 0.66, 0.66]) translate([26.4, 18.85, 55.75]) rotate([90, 0, 0]) pin_washer();
  color([0.85, 0.48, 0.18]) translate([26.4, 25.1, 55.75]) rotate([90, 0, 0]) lock_nut();
  color([0.55, 0.60, 0.65]) translate([-36, -16.8, 10.25]) rotate([0, 0, 0]) guide_bush_a();
  color([0.75, 0.30, 0.55]) translate([-36, 16.8, 10.25]) rotate([0, 0, 0]) guide_bush_b();
}

assembly();
